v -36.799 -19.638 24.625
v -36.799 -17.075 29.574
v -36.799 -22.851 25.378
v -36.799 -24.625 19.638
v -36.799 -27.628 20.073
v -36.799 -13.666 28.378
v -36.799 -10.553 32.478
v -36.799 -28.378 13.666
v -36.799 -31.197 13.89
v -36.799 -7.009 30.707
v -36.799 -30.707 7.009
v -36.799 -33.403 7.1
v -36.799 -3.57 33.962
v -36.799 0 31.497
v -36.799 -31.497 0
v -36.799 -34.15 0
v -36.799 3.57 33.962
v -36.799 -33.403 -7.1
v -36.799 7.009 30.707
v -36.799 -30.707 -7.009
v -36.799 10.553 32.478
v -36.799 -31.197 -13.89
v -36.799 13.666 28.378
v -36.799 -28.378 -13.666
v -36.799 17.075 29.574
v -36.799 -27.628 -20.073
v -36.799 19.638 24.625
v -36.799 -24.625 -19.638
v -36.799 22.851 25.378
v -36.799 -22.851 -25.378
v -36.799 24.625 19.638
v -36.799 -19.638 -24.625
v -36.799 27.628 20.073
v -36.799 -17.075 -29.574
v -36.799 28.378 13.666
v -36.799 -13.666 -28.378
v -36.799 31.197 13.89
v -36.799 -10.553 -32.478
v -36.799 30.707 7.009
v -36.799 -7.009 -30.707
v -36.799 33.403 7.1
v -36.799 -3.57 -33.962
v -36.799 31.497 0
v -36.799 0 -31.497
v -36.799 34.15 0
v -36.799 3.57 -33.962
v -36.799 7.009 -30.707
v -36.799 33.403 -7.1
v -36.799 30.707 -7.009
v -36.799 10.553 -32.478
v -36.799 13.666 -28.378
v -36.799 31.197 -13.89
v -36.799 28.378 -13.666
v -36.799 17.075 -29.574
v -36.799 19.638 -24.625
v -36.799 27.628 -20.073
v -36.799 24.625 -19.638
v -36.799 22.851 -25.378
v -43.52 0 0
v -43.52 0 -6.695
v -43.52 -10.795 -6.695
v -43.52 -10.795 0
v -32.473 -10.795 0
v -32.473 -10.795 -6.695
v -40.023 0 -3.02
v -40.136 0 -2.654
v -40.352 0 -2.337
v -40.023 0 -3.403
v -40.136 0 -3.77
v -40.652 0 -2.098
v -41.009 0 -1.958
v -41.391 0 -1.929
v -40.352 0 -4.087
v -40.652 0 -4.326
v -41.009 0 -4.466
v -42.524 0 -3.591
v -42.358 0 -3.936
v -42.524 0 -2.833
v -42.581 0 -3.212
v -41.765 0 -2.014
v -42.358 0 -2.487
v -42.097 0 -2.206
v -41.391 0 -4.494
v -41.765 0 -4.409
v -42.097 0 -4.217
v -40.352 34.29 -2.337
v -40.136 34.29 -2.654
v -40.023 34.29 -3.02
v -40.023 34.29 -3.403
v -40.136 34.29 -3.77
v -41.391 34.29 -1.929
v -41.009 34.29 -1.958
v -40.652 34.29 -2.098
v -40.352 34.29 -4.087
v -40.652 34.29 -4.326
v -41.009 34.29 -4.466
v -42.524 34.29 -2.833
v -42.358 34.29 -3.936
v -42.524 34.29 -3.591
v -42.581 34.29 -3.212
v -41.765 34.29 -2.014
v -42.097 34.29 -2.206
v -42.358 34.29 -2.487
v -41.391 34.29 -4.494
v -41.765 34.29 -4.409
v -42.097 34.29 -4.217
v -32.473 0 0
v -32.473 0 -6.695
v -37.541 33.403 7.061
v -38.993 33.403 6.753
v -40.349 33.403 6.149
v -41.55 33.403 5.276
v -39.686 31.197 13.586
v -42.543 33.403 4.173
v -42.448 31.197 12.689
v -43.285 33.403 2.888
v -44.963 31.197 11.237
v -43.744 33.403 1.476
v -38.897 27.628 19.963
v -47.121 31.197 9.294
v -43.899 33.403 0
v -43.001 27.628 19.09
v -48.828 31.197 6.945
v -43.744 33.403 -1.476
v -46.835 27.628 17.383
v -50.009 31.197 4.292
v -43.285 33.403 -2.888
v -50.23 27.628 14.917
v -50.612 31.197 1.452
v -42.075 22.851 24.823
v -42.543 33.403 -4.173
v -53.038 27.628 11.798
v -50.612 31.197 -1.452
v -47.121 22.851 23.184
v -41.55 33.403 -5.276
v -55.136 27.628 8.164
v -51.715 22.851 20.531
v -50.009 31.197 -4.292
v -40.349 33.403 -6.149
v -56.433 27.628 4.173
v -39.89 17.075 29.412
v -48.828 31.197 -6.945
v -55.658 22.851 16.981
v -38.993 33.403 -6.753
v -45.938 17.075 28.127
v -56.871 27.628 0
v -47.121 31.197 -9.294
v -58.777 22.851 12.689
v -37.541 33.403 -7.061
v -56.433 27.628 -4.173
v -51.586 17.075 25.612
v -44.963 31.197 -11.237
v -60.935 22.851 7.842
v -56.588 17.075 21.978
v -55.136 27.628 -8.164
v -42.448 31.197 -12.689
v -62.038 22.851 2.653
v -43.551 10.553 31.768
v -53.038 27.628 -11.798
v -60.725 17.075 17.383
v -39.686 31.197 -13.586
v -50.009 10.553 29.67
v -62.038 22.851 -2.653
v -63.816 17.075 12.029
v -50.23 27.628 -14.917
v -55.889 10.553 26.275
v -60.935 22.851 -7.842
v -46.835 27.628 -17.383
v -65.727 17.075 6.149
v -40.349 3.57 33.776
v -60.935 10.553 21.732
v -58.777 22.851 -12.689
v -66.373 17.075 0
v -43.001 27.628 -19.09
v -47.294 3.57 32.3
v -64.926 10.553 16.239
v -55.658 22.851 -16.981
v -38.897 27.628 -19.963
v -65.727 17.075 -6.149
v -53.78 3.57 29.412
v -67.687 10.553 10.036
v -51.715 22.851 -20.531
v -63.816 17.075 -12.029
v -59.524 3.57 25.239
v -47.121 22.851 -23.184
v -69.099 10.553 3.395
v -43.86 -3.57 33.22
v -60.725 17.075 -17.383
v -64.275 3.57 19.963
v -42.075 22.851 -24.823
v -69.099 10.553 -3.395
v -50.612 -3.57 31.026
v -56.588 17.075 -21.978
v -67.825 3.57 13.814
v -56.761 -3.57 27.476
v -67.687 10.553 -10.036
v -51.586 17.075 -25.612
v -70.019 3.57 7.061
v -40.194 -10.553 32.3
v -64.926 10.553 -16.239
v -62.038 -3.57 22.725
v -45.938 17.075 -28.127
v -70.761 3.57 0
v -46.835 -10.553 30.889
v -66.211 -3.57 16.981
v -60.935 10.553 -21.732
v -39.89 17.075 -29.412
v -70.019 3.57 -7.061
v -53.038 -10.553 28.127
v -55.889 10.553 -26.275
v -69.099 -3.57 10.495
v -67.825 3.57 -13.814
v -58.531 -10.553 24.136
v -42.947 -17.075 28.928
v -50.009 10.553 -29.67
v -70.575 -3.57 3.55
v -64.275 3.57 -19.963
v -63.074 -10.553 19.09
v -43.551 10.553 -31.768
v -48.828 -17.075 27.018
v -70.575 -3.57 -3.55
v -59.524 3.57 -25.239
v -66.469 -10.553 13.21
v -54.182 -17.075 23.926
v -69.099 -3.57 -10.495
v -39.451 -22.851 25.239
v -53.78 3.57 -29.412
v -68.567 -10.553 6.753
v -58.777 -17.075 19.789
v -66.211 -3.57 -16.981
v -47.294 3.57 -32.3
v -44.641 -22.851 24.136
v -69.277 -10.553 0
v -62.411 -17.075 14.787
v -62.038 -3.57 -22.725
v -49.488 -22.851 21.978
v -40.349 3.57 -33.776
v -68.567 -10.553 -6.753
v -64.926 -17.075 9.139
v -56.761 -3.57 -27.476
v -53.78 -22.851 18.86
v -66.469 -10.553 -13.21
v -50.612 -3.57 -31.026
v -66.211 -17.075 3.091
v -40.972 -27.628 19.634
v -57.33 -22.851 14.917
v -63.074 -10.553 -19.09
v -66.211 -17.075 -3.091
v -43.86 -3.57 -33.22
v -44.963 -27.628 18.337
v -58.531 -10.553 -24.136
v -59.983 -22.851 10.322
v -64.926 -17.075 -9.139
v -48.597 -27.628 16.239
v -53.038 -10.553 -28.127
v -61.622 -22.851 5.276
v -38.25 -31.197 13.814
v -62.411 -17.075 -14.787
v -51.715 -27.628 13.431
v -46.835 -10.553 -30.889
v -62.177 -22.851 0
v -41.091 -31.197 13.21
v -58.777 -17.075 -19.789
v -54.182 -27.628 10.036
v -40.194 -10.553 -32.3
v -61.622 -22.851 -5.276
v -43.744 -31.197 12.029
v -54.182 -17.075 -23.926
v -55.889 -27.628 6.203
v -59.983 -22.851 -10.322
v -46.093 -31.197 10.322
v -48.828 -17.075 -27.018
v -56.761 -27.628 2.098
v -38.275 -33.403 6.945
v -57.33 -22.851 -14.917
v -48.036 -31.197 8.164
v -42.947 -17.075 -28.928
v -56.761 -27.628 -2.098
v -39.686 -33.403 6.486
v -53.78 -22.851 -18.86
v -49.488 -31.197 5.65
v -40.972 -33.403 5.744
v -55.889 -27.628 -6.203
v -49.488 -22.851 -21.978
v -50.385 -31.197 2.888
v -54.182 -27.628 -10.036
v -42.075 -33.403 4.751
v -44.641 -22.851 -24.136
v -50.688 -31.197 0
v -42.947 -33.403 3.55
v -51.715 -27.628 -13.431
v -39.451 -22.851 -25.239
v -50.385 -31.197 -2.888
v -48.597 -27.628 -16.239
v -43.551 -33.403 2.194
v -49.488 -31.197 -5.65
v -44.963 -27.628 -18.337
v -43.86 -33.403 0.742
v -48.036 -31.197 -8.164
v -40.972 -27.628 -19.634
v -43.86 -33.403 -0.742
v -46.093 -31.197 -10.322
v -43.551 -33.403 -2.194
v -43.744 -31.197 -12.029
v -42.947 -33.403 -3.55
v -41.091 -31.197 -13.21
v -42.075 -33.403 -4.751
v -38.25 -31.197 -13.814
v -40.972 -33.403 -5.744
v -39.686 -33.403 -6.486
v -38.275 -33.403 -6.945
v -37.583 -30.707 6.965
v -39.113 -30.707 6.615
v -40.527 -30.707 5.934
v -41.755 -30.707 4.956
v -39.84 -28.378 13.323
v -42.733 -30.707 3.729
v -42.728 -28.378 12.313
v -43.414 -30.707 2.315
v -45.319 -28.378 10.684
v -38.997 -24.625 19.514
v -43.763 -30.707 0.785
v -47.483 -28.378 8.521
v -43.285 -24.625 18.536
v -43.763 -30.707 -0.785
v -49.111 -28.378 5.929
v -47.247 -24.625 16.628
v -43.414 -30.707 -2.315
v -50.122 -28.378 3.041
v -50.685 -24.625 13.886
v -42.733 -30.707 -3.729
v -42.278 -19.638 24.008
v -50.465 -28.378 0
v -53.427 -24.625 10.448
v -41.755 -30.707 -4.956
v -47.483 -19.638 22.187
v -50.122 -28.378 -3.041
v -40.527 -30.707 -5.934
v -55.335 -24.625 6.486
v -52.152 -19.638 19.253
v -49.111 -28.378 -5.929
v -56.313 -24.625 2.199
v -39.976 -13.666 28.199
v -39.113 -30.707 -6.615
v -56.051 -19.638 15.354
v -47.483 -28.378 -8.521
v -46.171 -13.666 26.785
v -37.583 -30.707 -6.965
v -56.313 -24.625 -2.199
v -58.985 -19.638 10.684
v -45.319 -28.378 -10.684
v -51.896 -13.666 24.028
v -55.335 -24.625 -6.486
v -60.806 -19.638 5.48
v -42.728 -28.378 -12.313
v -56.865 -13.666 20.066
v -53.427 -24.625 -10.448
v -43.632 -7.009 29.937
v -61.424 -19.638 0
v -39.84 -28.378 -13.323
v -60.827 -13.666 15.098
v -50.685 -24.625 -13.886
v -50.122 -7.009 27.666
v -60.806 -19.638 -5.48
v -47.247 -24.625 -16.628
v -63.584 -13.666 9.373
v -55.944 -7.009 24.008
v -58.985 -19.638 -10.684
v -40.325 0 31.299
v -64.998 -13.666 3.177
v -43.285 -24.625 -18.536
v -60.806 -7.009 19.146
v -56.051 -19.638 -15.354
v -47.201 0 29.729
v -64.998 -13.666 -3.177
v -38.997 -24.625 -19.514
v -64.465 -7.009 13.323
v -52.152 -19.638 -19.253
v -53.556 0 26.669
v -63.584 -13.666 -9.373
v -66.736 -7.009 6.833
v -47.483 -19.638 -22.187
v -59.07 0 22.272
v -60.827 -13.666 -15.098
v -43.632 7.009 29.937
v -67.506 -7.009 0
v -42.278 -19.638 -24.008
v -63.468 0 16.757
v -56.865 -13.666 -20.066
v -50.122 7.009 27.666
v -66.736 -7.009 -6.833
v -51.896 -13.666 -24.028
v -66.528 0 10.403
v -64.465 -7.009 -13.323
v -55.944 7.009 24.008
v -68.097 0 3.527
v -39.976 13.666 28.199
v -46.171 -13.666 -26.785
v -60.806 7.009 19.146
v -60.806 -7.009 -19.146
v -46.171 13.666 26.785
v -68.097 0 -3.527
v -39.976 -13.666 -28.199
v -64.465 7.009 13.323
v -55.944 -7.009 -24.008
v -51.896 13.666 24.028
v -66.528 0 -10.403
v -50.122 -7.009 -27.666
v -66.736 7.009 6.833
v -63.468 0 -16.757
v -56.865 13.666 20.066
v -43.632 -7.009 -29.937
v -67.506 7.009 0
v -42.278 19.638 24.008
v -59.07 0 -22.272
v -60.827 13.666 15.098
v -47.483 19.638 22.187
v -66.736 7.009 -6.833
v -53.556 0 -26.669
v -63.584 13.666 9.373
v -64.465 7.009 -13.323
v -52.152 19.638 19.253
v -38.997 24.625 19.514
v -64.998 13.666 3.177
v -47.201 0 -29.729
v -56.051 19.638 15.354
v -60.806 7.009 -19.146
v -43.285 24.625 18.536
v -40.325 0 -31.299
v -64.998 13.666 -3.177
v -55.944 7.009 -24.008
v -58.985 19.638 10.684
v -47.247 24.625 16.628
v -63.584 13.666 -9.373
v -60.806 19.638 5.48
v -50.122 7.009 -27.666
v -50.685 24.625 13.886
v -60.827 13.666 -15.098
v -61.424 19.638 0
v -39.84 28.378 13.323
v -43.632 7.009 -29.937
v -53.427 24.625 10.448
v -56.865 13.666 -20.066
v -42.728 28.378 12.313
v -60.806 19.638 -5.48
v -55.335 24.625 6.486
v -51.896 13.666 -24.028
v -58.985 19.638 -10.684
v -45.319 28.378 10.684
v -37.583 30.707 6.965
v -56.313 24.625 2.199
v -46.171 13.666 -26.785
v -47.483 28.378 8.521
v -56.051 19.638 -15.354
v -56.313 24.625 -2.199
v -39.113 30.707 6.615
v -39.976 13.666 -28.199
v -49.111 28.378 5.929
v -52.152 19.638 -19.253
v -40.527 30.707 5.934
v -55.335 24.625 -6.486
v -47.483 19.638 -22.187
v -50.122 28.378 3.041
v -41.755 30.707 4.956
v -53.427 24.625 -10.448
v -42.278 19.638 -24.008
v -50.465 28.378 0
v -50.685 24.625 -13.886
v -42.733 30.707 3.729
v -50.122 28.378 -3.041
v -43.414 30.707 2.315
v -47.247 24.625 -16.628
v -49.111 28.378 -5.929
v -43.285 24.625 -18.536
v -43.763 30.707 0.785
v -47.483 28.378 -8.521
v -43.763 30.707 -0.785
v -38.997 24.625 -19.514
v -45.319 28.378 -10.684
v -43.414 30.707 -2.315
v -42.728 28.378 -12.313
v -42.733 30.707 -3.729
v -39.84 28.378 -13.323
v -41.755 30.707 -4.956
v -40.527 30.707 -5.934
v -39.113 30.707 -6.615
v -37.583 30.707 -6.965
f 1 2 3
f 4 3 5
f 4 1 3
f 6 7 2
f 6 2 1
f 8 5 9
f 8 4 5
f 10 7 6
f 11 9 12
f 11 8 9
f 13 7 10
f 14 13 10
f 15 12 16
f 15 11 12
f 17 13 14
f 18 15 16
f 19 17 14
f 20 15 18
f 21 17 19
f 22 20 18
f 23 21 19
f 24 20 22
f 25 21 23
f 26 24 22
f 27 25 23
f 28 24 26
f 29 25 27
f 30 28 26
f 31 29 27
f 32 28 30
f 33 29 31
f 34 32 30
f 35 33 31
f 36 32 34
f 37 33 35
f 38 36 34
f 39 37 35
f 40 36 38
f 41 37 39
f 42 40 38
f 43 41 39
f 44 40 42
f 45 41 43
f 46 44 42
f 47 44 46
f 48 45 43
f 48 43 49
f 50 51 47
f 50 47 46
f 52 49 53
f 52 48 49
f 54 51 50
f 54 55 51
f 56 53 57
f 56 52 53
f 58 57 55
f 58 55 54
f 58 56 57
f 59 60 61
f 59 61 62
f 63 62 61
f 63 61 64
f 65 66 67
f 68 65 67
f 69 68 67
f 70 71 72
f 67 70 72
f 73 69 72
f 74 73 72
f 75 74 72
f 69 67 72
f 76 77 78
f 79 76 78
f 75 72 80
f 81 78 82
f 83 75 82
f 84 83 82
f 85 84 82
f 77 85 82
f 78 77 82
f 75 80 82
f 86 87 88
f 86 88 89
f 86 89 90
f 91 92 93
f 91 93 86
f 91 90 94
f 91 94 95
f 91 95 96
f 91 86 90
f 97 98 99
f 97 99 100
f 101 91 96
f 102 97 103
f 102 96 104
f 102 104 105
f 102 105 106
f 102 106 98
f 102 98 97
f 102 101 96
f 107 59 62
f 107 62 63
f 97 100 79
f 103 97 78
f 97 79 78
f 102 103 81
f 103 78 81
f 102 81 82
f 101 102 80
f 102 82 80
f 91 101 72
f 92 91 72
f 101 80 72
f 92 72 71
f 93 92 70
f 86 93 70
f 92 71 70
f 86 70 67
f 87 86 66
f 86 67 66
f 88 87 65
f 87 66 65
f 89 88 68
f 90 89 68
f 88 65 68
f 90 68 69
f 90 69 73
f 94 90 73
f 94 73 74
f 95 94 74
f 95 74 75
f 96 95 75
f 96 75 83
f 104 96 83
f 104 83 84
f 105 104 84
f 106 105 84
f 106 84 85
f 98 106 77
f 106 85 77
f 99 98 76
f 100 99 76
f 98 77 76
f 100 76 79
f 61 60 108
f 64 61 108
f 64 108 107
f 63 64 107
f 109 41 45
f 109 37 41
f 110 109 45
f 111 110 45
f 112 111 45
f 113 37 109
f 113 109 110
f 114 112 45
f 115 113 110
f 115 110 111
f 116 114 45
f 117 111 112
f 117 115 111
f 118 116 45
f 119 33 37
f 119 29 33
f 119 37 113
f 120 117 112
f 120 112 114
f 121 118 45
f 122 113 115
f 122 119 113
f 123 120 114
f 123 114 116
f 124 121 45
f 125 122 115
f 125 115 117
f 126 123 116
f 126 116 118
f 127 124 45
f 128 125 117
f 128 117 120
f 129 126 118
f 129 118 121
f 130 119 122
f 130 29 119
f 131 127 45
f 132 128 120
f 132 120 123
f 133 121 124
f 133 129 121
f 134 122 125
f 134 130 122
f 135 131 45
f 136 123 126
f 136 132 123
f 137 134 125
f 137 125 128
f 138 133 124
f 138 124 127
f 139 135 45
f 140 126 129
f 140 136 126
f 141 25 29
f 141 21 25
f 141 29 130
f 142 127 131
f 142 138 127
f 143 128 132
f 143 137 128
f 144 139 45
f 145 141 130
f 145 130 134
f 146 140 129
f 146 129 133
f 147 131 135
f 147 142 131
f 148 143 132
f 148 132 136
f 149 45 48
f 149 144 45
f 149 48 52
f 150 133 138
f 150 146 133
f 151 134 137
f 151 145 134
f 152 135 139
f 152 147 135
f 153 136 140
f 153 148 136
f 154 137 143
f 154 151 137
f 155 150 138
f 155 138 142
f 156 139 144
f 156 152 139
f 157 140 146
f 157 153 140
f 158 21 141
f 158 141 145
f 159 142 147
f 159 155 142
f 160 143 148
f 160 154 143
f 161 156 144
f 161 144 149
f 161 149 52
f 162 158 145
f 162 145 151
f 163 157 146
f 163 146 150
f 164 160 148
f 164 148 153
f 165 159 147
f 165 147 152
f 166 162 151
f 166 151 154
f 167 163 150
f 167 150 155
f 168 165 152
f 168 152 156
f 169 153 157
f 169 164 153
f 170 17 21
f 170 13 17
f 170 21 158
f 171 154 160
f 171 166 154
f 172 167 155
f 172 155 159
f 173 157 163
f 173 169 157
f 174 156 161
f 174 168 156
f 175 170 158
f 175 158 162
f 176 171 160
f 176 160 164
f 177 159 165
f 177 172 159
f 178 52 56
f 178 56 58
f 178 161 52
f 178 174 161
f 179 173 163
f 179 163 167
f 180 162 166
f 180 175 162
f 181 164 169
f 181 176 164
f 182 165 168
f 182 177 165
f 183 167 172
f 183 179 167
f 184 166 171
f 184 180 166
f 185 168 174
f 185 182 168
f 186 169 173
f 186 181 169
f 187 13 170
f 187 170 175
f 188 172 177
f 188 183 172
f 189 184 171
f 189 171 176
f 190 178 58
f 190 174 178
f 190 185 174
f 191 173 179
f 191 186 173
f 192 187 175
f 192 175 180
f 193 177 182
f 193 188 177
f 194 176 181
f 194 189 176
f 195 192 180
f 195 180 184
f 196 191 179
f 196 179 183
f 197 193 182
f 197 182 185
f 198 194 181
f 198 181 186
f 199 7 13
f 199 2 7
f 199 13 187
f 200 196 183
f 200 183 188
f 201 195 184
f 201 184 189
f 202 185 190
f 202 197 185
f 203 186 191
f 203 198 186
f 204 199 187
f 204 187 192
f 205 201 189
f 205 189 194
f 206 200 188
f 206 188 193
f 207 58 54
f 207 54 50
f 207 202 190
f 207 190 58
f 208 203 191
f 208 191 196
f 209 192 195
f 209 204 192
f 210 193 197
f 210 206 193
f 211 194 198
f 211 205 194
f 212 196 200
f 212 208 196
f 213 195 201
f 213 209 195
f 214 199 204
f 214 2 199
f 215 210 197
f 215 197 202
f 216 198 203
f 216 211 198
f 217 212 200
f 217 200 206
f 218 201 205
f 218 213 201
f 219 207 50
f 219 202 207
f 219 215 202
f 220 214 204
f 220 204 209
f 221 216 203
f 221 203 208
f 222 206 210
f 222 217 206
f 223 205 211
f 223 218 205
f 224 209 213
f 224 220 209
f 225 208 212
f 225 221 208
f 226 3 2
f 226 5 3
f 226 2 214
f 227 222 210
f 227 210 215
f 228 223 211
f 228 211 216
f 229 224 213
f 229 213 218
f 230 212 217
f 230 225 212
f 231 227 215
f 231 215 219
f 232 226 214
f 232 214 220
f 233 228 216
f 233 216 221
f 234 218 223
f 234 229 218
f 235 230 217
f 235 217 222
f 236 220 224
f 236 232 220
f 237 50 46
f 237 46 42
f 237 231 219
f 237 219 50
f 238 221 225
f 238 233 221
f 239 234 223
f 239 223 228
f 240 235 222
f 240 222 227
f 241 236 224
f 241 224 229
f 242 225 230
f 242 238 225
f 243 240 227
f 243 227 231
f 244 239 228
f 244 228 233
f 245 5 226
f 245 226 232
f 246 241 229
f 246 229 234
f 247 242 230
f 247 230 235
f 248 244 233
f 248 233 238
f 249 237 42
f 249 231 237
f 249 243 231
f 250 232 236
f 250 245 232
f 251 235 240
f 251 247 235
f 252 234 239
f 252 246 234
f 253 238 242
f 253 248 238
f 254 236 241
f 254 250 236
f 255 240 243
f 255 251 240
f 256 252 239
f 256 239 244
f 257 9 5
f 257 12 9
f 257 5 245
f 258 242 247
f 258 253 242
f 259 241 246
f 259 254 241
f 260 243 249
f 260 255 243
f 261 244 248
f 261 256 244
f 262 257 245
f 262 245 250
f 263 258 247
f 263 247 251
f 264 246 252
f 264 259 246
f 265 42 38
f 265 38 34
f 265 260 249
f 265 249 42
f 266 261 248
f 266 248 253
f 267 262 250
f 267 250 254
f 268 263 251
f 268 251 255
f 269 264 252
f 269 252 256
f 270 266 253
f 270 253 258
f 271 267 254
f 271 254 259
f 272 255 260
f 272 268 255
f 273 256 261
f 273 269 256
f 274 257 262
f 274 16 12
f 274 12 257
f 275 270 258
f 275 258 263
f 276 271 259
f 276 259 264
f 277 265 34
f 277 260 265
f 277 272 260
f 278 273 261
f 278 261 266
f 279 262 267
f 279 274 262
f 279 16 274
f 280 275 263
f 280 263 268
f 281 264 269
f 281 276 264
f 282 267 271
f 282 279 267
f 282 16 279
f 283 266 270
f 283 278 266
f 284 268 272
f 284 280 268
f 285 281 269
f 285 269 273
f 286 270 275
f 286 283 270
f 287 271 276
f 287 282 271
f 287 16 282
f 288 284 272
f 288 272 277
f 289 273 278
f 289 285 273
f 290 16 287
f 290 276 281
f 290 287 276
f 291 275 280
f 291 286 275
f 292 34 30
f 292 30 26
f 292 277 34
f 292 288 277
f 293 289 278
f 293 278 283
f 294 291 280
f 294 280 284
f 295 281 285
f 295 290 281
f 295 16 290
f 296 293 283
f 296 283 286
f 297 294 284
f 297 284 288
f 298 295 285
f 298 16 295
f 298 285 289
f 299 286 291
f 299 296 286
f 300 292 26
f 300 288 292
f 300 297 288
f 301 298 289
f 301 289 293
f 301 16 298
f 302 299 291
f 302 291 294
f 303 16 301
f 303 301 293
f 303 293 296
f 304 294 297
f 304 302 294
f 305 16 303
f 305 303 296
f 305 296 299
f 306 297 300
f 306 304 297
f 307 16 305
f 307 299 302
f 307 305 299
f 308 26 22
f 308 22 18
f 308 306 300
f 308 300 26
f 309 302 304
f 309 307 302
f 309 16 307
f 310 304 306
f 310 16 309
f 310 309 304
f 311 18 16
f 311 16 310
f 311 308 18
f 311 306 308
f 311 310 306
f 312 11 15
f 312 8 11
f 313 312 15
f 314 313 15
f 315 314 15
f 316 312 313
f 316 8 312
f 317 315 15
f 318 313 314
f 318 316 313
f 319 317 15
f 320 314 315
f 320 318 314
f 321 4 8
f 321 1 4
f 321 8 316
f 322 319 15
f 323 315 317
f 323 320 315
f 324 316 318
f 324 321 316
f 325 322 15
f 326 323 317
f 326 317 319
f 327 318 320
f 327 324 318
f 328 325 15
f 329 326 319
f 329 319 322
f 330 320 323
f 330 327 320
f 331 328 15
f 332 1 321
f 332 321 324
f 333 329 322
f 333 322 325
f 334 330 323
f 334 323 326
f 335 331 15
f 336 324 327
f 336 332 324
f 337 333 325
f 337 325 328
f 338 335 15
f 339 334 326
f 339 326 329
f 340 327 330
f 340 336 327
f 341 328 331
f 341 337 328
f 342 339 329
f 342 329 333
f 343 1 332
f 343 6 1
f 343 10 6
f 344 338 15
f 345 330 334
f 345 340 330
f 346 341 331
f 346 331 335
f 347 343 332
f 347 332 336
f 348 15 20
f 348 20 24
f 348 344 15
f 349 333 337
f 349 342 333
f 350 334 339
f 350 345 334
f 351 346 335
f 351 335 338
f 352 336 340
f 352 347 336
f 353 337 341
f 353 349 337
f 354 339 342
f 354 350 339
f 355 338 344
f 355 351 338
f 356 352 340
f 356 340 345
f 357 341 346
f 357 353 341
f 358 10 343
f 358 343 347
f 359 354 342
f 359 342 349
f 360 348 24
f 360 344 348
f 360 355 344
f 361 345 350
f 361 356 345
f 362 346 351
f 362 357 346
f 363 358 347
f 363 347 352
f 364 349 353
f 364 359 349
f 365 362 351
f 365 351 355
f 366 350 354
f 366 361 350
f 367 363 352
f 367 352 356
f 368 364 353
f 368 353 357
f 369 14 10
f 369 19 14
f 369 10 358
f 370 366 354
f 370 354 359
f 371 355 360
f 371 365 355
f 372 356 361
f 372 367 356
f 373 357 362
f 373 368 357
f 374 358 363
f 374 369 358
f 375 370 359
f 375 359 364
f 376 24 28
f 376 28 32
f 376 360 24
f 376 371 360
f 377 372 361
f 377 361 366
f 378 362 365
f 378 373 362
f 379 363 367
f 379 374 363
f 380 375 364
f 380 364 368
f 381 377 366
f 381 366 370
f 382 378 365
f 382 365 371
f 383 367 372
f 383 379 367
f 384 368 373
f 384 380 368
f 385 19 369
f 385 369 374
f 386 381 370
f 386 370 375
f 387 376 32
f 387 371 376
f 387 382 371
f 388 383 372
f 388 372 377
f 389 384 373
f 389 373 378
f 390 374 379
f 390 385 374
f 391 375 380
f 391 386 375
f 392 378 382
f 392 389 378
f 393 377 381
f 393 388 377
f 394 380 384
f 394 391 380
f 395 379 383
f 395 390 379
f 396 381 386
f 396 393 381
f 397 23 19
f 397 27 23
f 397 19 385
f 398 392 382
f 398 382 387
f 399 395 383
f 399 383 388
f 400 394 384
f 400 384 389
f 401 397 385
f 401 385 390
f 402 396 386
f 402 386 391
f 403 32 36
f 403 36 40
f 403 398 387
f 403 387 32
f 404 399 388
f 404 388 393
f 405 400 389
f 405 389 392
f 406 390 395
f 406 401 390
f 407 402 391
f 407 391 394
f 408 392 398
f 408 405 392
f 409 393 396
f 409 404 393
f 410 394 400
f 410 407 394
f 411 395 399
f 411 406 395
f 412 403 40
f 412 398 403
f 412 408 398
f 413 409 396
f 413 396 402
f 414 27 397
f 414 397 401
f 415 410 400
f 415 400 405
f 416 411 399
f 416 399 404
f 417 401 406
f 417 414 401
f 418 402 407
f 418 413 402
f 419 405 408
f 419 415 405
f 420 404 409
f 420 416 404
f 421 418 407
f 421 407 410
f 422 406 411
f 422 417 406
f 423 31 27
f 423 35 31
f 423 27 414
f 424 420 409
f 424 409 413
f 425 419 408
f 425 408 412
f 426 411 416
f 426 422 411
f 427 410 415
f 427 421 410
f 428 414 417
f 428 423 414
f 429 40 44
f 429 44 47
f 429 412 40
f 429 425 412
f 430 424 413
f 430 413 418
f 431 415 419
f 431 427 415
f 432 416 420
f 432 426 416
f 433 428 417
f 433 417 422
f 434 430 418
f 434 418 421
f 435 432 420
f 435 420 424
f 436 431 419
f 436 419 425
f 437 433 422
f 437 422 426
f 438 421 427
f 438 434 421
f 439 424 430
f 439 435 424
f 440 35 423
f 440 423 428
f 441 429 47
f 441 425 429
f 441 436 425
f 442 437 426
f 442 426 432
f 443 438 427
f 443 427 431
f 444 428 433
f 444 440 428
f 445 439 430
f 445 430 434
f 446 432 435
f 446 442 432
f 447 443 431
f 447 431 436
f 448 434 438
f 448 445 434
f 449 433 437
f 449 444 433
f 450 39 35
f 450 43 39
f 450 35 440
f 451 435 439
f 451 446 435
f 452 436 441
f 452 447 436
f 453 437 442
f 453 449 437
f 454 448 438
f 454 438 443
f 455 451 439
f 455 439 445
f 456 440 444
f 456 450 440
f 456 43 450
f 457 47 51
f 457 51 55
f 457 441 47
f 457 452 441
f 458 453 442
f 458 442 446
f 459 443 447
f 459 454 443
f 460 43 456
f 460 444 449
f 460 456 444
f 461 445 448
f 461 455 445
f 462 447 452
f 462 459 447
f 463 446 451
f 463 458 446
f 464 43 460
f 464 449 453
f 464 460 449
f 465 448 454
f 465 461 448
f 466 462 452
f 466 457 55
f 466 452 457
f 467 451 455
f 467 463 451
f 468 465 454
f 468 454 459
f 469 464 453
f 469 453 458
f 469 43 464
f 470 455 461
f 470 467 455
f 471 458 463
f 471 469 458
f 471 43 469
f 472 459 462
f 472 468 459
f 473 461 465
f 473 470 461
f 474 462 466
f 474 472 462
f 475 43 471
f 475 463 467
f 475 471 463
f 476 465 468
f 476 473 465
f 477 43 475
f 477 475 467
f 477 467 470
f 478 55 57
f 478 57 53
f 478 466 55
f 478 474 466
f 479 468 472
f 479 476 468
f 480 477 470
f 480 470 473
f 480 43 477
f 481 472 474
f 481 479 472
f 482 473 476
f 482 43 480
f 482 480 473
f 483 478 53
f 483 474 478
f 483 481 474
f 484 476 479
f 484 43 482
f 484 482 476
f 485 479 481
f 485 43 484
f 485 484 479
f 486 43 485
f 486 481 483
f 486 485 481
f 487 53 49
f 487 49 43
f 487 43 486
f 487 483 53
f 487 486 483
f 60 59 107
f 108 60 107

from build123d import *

# Parameters (mm, degrees)
F2_ANGLE_BACK = 90
F2_ANGLE      = 180
F1_W          = 11.0474079847
F1_H          = 6.6953976639
F3_DEPTH      = 10.795
F4_R          = 1.2862448739
F5_DEPTH      = 34.29


with BuildPart() as f2:
    # F0 (on Top) → F2 (revolve)
    with BuildSketch(Plane.XY, mode=Mode.PRIVATE) as f2_sk:
        with BuildLine():
            Line((-36.7986112833, 31.4967759484), (-36.7986112833, 34.1495558188))
            ThreePointArc((-36.7986112833, 34.1495558188), (-70.9481671021, 0), (-36.7986112833, -34.1495558188))
            Line((-36.7986112833, -34.1495558188), (-36.7986112833, -31.4967759484))
            ThreePointArc((-36.7986112833, -31.4967759484), (-68.2953872317, 0), (-36.7986112833, 31.4967759484))
        make_face()
    revolve(f2_sk.sketch.rotate(Axis((-36.7986112833, -8.9311953634, 0), (0, -1, 0)), -F2_ANGLE_BACK), axis=Axis((-36.7986112833, -8.9311953634, 0), (0, -1, 0)), revolution_arc=F2_ANGLE)


with BuildPart() as f3:
    # F1 (on Front) → F3 (new body)
    with BuildSketch(Plane.XZ):
        with Locations((-37.9963815212, -3.3476988319)):
            Rectangle(F1_W, F1_H)
    extrude(amount=F3_DEPTH)


with BuildPart() as f5:
    # F4 (on face) → F5 (new body)
    with BuildSketch(Plane(origin=(0, 0, 0), x_dir=(-1, 0, 0), z_dir=(0, 1, 0))):
        with Locations((41.2951931357, -3.2116398215)):
            Circle(F4_R)
    extrude(amount=F5_DEPTH)


solid = Compound([f2.part, f3.part, f5.part])
